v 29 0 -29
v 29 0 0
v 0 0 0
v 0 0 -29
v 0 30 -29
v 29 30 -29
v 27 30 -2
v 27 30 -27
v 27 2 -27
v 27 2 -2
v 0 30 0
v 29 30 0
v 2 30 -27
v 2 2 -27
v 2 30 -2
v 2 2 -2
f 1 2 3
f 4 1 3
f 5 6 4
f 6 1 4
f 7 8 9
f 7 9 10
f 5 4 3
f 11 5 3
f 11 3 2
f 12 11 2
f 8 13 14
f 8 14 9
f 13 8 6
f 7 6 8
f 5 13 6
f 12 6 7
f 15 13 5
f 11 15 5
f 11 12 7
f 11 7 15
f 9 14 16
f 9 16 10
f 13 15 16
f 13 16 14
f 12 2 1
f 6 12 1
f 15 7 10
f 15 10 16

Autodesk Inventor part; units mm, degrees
ref_plane "YZ Plane" through (0, 0, 0) normal (1, 0, 0) x (0, 1, 0)
ref_plane "XZ Plane" through (0, 0, 0) normal (0, 1, 0) x (-1, 0, 0)
ref_plane "XY Plane" through (0, 0, 0) normal (0, 0, 1) x (1, 0, 0)
sketch "Sketch7" plane through (0, 0, 0) normal (0, 1, 0) x (-1, 0, 0)
  point P0 (0, 0)
sketch "Sketch8" plane through (0, 0, 0) normal (0, 1, 0) x (-1, 0, 0)
  line L0 (0, 0) -> (-29, 0)
  line L1 (-29, 0) -> (-29, -29)
  line L2 (-29, -29) -> (0, -29)
  line L3 (0, -29) -> (0, 0)
  line L4 (-2, -27) -> (-27, -27)
  line L5 (-27, -27) -> (-27, -2)
  line L6 (-27, -2) -> (-2, -2)
  line L7 (-2, -2) -> (-2, -27)
  dimension "d25" = 29
  dimension "d26" = 29
  dimension "d38" = 2
extrude "Extrusion5" add sketch "Sketch8" along normal blind 30 contours L3 L2 L1 L0 | L4 L5 L6 L7
sketch "Sketch11" plane through (0, 30, 0) normal (0, 1, 0) x (1, 0, 0)
  line L0 (0, 0) -> (29, 0) projected
  line L1 (29, 0) -> (29, 29) projected
  line L2 (29, 29) -> (0, 29) projected
  line L3 (0, 29) -> (0, 0) projected
  line L4 (2, 27) -> (27, 27)
  line L5 (27, 27) -> (27, 2)
  line L6 (27, 2) -> (2, 2)
  line L7 (2, 2) -> (2, 27)
  dimension "d39" = 2
extrude "Extrusion8" cut sketch "Sketch11" against normal blind 28 contours L4 L5 L6 L7
equation "\"BendRadius\" = Thickness"
equation "\"BendReliefWidth\" = Thickness"
equation "\"BendReliefDepth\" = 0.5 * Thickness"
equation "\"CornerReliefSize\" = 4 * Thickness"
equation "\"MinimumRemnant\" = 2 * Thickness"
equation "\"TransitionRadius\" = BendRadius"
equation "\"JacobiRadiusSize\" = Thickness"
equation "\"GapSize\" = Thickness"
equation "\"Thickness\" = 0.5"
properties part number "waterBallonHolderv2"
